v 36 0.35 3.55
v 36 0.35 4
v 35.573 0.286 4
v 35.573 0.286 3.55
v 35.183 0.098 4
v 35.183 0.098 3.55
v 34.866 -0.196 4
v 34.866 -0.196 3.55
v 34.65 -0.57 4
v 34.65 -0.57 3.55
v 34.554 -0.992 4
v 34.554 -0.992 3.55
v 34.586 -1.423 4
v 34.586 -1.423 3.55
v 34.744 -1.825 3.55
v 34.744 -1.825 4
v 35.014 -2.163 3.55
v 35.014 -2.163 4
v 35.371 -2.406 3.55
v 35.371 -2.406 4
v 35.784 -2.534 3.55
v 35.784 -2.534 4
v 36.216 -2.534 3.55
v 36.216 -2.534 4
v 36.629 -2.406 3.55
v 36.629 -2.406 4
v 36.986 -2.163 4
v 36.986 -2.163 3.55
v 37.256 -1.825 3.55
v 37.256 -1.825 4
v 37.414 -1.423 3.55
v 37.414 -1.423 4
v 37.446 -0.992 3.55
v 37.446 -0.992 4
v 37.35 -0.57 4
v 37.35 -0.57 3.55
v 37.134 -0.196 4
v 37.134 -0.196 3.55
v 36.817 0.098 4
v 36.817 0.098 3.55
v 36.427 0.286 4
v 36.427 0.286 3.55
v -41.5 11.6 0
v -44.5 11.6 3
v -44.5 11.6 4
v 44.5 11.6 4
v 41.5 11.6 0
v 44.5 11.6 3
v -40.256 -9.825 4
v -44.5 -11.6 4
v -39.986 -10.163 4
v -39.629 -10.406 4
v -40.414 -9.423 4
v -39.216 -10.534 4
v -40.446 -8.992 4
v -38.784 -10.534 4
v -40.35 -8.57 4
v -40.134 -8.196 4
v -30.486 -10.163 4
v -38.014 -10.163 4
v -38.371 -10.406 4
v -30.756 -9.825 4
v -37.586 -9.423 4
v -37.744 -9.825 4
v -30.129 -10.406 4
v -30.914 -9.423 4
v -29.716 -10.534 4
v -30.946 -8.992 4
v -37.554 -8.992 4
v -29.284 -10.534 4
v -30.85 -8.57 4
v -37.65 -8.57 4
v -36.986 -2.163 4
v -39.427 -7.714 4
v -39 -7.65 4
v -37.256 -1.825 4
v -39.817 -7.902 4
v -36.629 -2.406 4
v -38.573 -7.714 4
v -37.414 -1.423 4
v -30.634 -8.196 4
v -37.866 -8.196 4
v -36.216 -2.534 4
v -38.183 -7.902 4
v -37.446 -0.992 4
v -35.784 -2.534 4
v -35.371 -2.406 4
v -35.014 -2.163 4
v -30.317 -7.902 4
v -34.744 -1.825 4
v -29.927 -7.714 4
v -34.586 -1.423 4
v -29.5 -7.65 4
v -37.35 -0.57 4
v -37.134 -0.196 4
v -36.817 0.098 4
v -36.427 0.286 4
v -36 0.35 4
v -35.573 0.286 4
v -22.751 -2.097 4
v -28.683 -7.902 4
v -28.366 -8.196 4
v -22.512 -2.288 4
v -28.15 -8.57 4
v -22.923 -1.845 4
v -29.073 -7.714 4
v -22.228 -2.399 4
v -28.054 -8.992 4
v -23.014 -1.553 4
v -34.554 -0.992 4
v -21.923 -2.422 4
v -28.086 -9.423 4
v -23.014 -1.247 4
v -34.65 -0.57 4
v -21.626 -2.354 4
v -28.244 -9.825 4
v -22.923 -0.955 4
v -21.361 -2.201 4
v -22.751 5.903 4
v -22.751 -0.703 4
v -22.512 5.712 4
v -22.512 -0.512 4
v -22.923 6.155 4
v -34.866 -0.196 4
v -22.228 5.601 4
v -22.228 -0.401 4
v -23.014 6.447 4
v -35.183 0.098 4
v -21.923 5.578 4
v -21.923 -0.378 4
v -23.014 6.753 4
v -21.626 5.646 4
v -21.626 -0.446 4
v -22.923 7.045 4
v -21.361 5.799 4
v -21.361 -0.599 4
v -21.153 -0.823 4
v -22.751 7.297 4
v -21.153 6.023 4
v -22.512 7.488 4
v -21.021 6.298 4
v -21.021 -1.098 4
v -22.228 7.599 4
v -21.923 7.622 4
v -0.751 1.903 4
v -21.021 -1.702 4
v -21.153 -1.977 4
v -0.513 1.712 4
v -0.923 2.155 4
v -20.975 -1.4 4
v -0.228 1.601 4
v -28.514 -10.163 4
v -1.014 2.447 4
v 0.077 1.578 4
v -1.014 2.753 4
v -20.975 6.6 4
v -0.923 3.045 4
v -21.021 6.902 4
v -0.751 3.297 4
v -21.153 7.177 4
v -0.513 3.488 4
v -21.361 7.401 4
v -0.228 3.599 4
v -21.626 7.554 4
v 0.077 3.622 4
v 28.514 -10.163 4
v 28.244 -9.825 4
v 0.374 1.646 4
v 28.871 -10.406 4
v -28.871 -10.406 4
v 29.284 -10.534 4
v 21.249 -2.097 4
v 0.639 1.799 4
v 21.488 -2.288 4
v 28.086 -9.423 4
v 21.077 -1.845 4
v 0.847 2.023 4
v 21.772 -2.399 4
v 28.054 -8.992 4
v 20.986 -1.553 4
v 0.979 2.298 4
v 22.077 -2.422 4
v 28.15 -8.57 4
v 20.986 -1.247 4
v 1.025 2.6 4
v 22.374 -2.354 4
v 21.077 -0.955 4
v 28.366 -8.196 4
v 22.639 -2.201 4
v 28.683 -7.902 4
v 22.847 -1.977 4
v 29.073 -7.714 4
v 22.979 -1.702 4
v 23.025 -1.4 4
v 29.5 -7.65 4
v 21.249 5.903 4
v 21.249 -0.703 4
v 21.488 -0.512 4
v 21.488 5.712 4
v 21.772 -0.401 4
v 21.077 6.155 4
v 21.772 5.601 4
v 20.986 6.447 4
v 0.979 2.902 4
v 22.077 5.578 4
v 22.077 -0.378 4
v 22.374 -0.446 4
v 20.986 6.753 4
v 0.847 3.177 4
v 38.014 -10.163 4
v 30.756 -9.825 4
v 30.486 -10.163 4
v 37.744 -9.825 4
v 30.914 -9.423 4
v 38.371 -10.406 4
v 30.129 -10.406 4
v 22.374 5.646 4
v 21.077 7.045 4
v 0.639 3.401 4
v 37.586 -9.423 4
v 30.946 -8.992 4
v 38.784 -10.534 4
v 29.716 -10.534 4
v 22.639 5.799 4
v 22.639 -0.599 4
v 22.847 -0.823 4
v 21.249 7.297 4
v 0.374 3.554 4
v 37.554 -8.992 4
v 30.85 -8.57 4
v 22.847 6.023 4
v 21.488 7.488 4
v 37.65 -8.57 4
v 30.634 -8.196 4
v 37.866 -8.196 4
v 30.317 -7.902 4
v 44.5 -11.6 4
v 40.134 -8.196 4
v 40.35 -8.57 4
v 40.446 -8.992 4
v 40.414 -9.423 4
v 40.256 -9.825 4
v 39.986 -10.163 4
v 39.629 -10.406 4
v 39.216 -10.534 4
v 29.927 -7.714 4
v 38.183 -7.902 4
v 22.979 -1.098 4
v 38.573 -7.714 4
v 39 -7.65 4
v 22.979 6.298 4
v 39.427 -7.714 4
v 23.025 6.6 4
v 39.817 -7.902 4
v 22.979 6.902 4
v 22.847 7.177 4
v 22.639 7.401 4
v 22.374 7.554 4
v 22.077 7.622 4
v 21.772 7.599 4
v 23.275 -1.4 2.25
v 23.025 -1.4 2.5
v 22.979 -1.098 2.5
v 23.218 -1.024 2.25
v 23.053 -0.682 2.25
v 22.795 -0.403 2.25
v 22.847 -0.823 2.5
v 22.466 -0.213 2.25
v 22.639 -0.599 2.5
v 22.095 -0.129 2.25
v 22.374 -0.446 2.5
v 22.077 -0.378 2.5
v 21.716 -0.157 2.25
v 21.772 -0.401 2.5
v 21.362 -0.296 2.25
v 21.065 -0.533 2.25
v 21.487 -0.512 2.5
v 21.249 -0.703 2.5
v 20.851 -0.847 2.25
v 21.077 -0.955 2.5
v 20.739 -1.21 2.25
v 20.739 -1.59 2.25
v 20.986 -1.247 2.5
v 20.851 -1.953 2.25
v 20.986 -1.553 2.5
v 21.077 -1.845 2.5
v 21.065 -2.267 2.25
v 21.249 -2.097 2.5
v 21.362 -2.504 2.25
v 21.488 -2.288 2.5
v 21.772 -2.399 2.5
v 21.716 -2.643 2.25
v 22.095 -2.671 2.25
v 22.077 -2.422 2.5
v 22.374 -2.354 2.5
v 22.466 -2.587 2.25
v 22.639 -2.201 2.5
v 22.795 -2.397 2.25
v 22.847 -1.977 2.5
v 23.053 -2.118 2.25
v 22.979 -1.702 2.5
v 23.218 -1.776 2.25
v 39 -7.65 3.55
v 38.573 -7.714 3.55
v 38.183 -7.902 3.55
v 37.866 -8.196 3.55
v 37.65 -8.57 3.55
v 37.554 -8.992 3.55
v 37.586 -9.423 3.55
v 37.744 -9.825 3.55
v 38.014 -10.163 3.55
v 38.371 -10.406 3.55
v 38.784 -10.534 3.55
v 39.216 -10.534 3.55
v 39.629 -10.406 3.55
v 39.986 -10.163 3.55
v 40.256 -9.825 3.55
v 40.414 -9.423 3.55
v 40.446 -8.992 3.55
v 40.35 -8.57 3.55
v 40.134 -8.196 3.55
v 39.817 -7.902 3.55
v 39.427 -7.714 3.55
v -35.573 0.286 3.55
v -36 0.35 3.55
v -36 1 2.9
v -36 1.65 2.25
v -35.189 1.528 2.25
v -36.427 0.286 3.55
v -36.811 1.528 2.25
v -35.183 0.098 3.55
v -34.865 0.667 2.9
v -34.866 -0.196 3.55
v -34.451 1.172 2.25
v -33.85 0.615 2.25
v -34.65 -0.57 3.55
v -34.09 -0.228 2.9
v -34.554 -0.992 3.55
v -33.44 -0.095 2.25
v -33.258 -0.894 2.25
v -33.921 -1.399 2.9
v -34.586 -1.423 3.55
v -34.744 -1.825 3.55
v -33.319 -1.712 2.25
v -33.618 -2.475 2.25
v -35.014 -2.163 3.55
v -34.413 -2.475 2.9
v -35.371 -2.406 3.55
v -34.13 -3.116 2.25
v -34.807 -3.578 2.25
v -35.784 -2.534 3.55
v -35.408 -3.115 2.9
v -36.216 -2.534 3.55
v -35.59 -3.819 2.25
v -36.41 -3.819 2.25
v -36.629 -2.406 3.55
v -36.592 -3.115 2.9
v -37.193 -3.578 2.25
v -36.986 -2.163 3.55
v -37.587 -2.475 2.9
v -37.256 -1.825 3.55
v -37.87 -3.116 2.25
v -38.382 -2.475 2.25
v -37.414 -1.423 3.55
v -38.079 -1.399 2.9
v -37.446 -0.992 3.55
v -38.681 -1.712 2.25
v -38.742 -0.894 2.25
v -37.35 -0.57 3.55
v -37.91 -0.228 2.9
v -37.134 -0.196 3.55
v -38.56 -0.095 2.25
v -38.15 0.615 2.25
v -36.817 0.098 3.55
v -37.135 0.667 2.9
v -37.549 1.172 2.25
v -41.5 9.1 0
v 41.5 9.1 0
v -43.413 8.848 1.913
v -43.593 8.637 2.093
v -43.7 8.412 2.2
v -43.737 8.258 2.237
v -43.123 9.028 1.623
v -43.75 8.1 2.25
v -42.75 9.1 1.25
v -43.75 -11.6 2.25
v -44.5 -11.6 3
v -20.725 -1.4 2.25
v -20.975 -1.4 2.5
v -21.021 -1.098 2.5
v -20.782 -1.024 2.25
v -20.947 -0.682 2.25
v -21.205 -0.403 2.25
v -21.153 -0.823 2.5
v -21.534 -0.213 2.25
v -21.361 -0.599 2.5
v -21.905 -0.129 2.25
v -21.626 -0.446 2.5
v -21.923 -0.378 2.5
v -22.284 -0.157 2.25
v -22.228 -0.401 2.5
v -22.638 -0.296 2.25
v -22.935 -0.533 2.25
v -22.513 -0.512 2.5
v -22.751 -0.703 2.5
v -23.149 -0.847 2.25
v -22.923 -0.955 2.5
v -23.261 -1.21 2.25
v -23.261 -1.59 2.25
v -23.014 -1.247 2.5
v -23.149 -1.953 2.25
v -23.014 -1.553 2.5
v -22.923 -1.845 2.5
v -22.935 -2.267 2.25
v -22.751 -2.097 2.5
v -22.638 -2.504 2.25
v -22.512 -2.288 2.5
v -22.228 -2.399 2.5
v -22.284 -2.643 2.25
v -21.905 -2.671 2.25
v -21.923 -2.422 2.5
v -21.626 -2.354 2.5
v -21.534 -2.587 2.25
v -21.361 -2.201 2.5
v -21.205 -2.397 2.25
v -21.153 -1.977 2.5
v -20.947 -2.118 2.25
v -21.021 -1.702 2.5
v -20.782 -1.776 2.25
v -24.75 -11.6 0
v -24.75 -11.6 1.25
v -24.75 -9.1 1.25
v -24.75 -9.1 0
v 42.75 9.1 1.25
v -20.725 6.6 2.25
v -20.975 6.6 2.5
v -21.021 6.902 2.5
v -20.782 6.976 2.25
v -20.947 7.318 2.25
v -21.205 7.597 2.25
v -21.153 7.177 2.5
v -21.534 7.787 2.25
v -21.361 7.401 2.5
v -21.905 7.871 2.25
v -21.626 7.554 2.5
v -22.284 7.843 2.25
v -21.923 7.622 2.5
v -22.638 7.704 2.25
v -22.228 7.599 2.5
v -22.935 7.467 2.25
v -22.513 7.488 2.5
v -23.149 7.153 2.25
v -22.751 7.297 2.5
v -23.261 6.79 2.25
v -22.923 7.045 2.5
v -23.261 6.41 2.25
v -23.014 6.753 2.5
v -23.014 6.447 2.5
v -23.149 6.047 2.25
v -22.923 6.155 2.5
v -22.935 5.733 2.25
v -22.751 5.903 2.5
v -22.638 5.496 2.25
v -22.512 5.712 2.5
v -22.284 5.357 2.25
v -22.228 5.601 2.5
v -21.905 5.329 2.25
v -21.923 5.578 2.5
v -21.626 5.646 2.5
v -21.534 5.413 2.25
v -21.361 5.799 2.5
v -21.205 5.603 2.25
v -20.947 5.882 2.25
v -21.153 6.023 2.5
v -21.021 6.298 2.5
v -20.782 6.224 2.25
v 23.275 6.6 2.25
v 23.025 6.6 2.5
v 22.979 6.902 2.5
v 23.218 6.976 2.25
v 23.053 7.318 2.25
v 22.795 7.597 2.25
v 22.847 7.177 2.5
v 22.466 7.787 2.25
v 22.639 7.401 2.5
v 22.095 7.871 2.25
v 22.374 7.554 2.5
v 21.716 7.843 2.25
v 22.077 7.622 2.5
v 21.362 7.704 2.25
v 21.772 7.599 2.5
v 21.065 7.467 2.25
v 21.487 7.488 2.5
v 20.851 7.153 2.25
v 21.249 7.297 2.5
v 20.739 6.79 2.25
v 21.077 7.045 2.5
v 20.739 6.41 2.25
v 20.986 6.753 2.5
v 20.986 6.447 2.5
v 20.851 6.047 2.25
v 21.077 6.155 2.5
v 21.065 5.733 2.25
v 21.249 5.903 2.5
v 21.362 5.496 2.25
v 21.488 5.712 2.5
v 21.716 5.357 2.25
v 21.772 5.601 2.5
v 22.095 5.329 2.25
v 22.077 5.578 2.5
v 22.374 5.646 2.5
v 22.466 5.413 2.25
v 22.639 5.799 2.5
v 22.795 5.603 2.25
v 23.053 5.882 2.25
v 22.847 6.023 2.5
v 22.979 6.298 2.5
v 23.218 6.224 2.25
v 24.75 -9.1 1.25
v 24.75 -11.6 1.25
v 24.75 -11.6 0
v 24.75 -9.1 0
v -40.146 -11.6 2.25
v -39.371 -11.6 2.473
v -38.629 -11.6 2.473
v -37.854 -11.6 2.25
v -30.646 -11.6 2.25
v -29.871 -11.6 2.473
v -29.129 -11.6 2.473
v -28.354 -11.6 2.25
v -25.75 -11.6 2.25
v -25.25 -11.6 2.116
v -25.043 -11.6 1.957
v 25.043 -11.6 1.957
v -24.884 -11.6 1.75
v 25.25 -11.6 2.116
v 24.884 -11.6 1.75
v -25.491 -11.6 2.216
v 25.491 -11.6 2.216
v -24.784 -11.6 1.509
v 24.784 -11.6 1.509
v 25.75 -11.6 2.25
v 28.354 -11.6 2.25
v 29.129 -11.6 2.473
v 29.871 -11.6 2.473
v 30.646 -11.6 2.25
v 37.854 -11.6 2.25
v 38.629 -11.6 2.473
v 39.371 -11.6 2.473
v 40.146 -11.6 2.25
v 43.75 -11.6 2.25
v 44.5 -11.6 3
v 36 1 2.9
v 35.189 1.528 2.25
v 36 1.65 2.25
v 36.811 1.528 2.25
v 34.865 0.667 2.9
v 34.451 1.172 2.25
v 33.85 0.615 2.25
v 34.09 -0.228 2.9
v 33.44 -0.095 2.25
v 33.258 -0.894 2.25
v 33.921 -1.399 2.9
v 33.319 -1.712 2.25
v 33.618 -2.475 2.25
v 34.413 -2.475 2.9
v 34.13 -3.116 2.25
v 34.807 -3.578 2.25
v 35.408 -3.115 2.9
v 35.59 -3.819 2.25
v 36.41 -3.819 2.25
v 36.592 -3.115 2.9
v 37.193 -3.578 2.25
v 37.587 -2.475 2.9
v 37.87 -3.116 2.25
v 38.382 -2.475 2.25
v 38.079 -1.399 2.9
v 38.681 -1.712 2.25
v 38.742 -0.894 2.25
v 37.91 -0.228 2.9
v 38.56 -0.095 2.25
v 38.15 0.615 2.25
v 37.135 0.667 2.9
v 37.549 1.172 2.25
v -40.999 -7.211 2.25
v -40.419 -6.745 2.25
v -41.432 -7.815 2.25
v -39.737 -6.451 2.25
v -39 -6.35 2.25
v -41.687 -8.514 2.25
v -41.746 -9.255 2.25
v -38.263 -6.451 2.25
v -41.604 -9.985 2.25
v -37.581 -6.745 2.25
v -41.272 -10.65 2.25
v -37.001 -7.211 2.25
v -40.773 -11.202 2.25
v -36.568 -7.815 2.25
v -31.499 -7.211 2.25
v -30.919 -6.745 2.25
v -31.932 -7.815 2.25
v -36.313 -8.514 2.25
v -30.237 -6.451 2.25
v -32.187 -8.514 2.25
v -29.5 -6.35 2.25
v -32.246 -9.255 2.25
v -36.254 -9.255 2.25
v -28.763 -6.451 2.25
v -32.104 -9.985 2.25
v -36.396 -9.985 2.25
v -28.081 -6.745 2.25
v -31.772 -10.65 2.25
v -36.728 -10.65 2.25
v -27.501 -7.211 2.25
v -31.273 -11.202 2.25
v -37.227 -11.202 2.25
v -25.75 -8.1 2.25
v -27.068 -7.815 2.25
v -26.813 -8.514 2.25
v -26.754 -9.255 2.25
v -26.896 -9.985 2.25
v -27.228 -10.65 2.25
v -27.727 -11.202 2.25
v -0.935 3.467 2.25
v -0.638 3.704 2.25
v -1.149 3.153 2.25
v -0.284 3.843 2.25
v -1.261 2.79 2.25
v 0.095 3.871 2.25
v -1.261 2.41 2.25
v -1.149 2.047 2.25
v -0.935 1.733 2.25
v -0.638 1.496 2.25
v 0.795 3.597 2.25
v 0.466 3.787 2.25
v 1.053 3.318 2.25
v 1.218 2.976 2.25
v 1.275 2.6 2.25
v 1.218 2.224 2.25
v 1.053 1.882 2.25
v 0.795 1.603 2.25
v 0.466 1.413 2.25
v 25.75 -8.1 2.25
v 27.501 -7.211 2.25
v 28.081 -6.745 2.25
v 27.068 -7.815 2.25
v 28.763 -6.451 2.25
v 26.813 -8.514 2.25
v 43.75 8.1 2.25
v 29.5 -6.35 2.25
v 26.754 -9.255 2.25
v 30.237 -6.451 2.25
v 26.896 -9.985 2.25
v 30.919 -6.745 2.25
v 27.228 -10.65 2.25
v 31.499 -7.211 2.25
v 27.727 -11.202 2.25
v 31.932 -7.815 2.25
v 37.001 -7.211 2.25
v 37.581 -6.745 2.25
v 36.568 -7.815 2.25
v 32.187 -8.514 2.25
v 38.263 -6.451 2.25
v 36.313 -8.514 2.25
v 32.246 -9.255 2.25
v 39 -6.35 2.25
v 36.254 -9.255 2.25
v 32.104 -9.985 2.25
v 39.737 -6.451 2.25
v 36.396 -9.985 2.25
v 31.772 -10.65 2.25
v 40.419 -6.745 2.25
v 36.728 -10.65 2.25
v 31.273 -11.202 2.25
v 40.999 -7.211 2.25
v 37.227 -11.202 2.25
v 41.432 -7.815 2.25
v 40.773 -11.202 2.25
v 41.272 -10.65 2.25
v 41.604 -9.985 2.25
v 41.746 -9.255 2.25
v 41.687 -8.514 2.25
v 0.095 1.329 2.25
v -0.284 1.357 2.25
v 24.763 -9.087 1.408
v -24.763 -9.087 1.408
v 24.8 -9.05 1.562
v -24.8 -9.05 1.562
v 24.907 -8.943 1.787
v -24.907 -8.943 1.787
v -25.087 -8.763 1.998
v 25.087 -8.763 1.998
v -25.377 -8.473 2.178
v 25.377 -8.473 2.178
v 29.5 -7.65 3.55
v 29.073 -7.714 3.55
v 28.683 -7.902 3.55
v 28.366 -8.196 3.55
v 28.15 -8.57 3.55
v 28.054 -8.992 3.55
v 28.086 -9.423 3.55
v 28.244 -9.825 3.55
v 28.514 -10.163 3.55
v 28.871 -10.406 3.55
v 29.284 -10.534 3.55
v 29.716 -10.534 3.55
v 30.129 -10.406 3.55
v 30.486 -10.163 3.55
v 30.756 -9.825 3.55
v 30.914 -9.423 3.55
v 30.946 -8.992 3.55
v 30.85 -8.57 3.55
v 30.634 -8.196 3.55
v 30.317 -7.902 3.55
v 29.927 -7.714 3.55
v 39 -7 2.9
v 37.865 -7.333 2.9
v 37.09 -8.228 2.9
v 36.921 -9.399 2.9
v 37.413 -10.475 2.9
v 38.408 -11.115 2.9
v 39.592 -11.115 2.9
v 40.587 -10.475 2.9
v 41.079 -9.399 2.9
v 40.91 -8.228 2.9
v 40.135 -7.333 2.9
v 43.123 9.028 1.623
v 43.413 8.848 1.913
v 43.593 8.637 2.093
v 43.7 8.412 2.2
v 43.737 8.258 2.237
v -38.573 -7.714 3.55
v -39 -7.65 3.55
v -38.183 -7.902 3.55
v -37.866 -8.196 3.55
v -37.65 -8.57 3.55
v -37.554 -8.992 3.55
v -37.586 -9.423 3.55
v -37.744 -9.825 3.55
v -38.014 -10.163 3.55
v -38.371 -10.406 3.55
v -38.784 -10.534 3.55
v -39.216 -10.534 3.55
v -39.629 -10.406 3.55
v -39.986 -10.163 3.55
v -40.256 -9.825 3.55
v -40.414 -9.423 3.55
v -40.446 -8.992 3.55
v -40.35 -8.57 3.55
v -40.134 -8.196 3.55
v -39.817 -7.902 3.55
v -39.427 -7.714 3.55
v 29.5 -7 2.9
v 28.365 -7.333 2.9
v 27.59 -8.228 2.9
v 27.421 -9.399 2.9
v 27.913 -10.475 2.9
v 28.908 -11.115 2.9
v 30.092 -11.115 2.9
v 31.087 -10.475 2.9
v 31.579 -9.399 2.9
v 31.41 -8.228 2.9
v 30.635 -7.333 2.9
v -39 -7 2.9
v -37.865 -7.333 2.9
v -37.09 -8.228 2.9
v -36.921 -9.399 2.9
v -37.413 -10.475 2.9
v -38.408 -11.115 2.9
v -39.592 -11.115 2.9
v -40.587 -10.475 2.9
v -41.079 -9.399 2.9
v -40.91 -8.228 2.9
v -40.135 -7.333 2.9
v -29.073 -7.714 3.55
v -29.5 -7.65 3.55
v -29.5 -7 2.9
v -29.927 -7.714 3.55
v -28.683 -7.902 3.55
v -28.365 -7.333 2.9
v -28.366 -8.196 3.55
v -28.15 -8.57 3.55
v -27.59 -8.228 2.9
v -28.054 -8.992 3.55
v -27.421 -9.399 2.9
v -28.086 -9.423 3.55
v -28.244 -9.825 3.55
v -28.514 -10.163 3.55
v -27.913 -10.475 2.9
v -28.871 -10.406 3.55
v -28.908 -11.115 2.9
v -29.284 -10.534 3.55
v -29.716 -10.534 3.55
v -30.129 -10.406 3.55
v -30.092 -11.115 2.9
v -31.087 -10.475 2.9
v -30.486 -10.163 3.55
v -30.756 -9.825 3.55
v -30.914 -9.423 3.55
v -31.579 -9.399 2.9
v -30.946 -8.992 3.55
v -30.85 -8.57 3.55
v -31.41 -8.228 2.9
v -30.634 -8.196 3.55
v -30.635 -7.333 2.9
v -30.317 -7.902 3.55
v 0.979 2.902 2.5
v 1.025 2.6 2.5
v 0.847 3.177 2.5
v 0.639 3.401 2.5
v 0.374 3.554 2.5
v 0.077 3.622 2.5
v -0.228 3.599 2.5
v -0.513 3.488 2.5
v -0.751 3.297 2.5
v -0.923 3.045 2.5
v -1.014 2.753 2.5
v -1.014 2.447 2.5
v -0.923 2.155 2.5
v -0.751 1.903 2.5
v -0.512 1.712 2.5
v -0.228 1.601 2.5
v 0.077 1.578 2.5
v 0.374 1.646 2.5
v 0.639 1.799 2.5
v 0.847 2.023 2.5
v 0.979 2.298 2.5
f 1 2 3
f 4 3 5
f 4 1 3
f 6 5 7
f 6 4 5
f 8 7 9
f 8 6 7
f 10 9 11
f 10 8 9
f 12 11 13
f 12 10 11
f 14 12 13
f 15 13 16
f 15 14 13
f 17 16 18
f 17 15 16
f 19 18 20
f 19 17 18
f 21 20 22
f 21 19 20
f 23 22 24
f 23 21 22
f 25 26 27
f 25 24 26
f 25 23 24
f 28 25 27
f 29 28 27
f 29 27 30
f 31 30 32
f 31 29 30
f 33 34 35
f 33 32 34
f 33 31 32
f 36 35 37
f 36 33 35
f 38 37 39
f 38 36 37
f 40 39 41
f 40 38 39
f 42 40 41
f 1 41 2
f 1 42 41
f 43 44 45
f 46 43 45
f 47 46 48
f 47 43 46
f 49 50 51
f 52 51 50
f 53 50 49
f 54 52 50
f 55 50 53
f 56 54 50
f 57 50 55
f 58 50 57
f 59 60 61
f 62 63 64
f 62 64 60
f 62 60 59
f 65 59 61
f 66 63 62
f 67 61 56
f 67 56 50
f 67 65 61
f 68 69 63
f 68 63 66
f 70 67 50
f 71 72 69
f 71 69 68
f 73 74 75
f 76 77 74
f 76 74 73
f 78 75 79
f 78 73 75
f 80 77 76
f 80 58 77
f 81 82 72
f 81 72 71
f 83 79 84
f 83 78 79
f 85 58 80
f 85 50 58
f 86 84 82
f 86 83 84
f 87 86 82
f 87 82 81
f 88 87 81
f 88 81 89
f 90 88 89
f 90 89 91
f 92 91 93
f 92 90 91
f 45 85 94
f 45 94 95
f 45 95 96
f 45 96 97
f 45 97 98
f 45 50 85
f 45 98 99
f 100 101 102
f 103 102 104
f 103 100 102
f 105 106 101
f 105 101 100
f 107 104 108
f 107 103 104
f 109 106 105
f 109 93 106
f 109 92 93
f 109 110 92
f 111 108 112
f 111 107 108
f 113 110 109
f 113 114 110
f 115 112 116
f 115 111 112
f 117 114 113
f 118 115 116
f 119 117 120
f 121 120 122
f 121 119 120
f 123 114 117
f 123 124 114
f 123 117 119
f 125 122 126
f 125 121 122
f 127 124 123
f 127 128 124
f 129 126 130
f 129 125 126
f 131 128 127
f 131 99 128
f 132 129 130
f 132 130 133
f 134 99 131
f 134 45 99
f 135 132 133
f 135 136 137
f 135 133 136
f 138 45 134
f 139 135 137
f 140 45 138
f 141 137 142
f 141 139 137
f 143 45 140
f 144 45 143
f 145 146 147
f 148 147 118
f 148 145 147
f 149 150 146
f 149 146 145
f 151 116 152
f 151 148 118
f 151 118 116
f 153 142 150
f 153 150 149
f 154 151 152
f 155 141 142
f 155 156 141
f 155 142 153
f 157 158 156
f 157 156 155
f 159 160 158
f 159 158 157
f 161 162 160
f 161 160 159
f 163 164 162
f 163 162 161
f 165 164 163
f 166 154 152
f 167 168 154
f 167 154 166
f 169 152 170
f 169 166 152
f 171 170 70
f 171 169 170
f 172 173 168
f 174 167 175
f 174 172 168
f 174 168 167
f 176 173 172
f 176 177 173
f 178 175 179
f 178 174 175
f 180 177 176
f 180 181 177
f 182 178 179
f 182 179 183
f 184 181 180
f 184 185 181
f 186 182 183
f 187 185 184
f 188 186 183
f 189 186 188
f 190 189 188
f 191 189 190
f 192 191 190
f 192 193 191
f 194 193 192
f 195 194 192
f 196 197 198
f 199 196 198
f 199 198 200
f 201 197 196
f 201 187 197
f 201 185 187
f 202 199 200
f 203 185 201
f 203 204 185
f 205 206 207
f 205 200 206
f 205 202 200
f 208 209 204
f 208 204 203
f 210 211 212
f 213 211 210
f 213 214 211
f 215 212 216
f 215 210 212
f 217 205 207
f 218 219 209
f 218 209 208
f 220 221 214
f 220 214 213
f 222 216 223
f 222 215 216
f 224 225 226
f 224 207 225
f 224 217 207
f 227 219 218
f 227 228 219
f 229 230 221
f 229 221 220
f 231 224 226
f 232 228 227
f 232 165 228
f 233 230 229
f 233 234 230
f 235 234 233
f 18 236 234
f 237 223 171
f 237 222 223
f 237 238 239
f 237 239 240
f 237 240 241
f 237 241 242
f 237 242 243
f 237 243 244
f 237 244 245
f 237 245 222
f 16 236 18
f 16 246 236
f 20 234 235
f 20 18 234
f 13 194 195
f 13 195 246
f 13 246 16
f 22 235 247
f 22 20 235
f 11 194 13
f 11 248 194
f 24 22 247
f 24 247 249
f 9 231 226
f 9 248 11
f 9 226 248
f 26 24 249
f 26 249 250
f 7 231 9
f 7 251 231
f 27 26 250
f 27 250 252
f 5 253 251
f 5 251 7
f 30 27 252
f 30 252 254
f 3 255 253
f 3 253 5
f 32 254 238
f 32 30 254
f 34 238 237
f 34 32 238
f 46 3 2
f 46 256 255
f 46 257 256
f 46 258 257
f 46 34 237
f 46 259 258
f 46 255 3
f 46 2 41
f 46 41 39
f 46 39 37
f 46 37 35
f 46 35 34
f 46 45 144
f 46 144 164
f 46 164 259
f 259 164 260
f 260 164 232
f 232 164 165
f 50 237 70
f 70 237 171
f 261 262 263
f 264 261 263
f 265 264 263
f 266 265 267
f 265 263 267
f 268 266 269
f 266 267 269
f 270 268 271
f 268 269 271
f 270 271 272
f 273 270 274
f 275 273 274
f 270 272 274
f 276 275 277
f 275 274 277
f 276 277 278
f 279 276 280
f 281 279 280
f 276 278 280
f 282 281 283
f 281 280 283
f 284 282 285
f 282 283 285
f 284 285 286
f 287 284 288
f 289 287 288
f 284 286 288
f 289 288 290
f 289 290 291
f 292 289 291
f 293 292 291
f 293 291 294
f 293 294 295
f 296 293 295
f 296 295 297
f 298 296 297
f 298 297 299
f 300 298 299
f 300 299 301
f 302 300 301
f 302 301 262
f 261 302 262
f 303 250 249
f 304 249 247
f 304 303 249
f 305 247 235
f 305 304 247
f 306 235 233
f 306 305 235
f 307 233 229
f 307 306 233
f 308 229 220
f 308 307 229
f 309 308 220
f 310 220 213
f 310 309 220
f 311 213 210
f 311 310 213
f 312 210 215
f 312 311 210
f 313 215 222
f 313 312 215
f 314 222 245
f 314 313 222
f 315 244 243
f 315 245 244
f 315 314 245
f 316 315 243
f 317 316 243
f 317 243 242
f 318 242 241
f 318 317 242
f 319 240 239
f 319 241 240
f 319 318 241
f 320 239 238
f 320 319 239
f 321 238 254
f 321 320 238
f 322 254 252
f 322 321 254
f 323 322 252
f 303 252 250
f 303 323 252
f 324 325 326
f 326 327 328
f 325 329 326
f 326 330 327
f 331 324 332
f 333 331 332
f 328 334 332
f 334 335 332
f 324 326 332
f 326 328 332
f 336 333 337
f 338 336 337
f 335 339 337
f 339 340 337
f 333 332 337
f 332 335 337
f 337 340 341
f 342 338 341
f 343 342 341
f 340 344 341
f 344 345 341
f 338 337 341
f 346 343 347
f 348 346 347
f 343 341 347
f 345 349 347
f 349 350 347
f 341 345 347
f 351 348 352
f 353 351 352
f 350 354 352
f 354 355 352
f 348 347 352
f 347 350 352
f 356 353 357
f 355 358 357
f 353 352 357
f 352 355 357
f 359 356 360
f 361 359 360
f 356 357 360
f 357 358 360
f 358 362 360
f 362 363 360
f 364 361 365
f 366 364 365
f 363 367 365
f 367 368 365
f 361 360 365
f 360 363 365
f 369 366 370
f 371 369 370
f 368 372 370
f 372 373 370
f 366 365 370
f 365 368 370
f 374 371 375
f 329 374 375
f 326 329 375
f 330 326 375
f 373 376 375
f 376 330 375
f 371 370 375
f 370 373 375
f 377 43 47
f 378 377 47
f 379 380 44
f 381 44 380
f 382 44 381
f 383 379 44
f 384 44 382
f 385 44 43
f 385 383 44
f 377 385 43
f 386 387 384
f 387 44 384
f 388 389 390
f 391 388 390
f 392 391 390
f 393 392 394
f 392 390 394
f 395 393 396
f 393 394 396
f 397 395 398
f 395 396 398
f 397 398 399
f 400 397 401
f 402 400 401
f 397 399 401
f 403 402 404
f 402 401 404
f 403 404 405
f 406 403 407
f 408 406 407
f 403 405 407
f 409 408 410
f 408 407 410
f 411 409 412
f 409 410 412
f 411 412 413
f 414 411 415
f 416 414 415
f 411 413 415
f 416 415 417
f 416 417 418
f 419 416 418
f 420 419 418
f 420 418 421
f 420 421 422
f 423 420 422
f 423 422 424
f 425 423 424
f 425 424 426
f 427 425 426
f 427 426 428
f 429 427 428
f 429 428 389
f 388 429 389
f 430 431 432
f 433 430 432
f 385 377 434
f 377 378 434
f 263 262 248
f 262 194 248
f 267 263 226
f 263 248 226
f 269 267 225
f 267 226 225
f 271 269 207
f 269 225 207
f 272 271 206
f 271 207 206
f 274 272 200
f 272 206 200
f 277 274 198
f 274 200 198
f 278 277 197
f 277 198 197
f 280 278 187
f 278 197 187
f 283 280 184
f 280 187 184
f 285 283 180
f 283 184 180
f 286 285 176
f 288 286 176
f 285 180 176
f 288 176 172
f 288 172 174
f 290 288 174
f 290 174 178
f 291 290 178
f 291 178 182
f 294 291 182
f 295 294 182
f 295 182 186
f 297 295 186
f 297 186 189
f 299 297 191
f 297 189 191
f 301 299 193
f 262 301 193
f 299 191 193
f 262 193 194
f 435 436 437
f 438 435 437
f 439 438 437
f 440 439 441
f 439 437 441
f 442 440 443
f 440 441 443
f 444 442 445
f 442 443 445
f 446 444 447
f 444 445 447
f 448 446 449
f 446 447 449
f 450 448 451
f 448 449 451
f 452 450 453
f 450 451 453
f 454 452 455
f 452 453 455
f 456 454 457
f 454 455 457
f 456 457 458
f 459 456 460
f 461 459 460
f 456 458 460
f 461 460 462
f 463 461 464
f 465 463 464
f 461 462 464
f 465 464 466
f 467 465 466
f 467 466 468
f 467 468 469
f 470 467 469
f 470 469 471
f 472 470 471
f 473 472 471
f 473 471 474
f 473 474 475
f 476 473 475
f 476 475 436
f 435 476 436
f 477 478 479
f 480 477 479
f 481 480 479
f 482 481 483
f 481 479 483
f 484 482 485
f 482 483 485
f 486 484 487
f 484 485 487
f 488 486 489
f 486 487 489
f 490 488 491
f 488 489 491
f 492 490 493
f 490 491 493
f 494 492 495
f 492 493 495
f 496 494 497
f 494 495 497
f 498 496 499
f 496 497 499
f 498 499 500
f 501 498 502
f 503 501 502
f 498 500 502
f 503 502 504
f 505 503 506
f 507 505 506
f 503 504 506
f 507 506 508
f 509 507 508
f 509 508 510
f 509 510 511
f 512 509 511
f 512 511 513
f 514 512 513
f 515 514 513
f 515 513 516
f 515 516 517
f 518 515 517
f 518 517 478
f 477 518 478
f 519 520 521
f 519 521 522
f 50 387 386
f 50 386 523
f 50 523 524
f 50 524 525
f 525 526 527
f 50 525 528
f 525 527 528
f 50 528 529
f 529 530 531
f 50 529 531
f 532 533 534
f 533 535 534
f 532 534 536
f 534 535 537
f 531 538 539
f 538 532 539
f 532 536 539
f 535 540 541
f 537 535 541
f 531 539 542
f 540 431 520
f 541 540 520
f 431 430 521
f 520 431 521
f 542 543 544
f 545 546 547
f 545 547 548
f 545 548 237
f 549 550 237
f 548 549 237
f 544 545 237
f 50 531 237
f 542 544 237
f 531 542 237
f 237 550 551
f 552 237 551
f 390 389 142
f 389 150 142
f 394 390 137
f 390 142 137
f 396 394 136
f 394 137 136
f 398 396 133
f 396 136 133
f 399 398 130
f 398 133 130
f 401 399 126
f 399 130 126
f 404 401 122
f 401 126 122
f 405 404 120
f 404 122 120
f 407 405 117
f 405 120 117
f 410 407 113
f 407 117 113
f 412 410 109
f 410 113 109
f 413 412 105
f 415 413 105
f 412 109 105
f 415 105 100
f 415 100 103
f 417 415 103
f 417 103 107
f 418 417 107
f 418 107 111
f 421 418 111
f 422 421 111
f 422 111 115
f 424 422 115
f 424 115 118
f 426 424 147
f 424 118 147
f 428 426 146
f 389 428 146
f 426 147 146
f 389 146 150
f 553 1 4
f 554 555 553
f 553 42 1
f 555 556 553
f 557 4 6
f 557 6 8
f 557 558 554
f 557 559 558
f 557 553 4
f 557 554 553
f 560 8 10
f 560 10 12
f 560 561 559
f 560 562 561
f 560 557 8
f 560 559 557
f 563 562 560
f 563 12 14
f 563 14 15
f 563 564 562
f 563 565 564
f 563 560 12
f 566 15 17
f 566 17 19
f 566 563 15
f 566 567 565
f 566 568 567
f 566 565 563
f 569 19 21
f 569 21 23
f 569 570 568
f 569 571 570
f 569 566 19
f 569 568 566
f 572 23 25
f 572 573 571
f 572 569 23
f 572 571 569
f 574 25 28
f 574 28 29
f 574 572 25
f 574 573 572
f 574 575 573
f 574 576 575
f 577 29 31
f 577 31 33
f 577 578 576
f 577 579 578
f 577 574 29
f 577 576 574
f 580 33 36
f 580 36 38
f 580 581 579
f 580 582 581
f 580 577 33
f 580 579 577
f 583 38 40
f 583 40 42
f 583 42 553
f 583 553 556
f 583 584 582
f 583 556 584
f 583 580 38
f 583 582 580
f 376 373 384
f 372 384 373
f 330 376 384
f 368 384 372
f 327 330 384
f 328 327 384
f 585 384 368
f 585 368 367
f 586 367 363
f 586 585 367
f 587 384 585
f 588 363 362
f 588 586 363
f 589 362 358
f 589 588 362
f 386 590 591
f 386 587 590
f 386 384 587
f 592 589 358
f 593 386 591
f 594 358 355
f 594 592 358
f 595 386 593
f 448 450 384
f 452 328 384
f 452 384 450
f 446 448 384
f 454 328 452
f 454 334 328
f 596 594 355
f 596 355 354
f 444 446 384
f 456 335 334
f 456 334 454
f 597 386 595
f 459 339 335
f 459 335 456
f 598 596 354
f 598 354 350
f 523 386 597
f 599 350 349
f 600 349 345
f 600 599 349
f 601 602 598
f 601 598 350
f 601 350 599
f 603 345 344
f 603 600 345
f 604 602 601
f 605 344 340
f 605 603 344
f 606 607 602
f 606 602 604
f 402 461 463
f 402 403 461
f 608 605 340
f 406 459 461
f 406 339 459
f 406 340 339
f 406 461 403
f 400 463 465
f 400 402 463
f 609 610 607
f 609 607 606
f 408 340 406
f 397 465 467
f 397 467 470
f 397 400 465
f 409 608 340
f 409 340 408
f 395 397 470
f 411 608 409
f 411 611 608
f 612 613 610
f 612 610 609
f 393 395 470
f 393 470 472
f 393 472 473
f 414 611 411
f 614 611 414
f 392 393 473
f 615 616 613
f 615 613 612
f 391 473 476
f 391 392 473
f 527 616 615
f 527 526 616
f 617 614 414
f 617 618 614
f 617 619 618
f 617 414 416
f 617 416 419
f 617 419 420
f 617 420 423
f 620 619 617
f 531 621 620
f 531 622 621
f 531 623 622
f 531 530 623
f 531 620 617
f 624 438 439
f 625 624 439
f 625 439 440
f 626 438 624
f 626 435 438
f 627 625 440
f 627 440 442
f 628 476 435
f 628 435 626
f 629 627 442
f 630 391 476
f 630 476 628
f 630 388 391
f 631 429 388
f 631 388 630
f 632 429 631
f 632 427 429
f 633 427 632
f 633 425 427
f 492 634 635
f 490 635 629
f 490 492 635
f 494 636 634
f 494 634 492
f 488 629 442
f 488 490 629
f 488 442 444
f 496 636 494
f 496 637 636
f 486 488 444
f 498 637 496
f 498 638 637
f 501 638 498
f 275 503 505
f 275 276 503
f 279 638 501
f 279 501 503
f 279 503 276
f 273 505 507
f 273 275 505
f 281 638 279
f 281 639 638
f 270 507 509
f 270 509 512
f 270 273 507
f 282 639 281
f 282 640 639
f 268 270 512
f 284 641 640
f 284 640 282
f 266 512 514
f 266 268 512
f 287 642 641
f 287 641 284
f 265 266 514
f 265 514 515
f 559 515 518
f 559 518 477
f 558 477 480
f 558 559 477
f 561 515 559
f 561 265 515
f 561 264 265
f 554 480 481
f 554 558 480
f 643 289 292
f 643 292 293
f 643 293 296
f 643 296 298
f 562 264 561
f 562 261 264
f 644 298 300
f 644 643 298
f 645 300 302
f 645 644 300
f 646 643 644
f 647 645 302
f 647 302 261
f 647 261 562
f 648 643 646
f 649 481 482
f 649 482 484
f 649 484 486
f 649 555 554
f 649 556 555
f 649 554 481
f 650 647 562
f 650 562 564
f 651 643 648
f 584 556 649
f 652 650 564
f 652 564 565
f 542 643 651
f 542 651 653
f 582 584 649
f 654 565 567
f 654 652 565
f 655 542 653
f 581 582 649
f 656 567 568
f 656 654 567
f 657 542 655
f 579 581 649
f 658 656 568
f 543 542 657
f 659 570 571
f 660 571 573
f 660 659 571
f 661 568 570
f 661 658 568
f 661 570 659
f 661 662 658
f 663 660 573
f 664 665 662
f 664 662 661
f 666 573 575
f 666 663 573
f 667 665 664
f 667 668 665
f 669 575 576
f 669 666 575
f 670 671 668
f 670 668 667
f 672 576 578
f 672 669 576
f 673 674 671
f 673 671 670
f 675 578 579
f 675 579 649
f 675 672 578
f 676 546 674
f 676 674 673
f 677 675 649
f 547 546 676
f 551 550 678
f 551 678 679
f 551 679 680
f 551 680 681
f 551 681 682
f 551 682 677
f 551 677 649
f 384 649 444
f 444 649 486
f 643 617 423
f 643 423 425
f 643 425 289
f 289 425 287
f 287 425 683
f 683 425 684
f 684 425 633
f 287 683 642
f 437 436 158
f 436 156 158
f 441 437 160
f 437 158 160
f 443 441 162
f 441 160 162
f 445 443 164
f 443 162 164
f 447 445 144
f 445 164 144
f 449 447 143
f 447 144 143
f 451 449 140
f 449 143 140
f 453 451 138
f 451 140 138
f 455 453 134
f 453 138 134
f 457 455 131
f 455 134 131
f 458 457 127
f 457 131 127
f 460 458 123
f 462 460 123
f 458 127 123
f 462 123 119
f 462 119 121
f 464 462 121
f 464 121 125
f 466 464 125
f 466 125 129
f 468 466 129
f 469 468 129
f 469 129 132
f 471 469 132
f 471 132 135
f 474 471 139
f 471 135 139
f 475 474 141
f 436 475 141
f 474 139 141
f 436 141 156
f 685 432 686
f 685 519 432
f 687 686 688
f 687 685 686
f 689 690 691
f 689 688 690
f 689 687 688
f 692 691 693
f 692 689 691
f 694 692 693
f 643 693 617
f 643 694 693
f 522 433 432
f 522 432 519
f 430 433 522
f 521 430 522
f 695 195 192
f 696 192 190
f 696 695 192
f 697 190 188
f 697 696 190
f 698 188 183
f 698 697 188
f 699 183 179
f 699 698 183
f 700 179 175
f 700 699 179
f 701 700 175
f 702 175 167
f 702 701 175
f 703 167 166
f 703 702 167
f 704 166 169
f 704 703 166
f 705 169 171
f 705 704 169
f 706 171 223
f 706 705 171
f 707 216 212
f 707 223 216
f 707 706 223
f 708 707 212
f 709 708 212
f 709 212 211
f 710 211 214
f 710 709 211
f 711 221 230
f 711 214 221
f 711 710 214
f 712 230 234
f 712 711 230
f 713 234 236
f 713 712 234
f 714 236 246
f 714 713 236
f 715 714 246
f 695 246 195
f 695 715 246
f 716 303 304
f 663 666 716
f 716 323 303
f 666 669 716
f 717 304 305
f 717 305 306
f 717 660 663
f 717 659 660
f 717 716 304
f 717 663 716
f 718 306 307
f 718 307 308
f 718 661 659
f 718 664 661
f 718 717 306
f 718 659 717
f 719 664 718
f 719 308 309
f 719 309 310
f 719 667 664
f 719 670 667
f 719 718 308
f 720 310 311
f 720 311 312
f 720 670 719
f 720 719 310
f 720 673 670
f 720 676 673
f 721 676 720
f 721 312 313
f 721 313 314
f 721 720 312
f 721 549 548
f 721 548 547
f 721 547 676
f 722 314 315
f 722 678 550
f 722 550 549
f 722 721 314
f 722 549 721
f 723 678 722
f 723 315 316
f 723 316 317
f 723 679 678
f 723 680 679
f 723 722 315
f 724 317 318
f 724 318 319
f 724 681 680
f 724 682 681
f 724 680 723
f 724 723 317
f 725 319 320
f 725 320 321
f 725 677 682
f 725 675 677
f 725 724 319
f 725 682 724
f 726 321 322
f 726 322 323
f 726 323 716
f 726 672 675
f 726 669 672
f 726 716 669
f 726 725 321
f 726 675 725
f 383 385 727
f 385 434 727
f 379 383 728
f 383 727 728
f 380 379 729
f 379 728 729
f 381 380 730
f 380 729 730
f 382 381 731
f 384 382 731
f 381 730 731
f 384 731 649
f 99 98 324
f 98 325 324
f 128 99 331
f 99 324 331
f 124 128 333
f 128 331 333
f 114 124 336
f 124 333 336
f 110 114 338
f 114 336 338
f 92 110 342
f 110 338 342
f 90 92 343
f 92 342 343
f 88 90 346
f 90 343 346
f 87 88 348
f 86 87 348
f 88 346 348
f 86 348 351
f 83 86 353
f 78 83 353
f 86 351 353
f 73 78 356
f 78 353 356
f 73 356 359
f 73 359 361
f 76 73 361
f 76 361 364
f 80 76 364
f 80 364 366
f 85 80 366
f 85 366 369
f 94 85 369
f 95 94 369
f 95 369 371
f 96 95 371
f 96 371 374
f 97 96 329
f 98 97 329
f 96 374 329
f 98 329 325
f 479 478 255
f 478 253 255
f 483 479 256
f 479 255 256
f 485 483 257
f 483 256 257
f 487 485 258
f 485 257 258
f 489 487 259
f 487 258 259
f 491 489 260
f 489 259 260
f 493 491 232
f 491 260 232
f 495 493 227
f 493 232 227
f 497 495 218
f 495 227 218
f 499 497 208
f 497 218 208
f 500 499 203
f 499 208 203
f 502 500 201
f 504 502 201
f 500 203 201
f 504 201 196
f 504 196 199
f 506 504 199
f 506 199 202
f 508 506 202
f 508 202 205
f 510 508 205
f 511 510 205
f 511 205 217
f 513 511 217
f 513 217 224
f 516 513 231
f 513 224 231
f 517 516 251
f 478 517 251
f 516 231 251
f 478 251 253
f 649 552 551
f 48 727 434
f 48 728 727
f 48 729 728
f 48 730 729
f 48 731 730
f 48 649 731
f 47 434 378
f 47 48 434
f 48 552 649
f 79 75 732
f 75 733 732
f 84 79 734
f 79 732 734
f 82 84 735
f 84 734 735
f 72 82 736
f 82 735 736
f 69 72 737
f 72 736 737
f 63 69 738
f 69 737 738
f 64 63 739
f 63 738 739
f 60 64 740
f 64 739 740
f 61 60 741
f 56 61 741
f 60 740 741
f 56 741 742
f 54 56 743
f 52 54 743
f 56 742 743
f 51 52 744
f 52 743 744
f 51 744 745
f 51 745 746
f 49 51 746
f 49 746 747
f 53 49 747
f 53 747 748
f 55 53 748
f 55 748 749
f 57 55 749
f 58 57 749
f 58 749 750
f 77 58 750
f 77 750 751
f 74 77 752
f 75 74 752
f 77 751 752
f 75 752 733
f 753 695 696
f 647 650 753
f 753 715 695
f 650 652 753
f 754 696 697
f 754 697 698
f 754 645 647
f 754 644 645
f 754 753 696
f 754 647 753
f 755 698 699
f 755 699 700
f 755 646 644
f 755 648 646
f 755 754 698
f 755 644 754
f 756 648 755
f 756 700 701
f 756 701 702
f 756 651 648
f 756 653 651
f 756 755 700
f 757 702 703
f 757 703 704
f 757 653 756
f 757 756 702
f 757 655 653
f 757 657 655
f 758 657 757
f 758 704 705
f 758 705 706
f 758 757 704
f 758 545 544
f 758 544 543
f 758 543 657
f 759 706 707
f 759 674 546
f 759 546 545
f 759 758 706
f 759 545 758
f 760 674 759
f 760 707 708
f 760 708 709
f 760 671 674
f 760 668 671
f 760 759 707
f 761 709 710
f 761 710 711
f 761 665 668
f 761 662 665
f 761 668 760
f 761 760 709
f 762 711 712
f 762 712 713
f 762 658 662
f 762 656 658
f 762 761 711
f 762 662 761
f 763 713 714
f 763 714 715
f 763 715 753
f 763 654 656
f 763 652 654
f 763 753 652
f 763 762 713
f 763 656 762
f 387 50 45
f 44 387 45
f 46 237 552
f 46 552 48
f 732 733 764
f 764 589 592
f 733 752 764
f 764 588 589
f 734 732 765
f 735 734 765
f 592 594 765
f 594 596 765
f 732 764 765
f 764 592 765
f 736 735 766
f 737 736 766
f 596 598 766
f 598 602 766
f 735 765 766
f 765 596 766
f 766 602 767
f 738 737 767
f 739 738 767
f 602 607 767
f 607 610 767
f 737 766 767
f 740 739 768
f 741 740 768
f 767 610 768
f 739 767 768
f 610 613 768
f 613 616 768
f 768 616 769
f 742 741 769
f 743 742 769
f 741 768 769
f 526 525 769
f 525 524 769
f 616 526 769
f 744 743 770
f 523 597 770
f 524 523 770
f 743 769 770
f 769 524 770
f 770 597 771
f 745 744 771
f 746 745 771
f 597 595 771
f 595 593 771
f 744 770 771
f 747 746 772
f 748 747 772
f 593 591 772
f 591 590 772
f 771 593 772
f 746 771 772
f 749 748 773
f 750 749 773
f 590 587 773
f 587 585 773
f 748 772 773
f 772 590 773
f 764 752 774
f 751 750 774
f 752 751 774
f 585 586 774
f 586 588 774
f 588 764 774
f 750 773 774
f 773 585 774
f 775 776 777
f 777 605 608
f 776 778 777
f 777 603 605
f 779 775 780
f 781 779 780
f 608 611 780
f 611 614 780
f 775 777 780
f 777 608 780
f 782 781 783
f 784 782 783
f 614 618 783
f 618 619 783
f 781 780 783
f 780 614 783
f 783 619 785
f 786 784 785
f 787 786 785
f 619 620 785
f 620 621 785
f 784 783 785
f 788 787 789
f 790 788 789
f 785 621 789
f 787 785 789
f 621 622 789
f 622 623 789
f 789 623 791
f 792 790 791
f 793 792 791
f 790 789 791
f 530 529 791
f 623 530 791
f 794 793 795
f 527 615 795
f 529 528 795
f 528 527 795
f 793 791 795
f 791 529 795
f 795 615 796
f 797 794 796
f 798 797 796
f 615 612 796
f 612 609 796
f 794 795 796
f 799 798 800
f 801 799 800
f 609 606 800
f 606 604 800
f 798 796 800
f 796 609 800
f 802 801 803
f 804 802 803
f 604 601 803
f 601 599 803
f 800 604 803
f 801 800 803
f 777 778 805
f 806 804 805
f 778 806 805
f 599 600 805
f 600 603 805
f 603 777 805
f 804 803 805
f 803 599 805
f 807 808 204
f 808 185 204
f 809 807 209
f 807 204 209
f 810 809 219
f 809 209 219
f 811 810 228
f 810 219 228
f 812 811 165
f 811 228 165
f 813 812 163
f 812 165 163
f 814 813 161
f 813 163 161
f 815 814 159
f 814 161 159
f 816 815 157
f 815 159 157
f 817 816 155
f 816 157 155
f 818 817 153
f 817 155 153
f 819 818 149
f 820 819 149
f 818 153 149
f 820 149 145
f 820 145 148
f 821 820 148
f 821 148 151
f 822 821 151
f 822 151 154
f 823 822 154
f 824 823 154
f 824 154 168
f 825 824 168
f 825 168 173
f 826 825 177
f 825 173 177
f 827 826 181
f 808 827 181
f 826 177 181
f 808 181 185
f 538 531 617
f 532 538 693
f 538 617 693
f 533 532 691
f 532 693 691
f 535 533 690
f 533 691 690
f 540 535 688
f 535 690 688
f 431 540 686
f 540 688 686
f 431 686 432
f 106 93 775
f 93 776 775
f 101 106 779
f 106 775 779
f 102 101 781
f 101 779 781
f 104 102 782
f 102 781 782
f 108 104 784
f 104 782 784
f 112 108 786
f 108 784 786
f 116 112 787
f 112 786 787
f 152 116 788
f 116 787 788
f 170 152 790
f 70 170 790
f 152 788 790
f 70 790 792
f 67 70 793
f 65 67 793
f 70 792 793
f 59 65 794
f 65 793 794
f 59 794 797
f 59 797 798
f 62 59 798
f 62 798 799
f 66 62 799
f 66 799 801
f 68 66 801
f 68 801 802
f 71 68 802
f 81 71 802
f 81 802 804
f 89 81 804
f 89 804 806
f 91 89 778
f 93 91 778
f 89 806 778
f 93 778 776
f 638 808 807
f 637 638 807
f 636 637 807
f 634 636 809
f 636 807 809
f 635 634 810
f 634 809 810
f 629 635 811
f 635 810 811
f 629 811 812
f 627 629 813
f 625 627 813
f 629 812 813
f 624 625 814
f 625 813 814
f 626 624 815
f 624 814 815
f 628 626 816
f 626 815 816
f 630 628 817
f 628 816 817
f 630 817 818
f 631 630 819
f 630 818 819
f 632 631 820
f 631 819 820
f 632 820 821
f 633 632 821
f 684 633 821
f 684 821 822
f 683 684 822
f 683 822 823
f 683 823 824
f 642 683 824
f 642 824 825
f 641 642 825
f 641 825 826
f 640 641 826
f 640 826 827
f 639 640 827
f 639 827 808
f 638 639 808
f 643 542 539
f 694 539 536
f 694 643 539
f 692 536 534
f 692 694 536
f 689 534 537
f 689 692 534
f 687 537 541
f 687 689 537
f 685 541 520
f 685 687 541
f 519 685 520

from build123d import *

# Parameters (mm, degrees)
SKETCH1_W                                      = 94
SKETCH1_H                                      = 23.2
BOSS_EXTRUDE1_DEPTH                            = 4
CHAMFER1_SIZE                                  = 5.5
CUT_EXTRUDE2_DEPTH                             = 48.12547082
CUT_EXTRUDE2_DEPTH_BACK                        = 48.12547082
SKETCH9_W                                      = 30.391833943
SKETCH9_H                                      = 23.2
SHELL1_START                                   = -9.1
SHELL1_DEPTH                                   = 18.2
FILLET1_R                                      = 1
M2_5X0_45_TAPPED_HOLE1_D                       = 2.05
M2_5X0_45_TAPPED_HOLE1_DEPTH                   = 6
M2_5X0_45_TAPPED_HOLE1_CSINK_D                 = 2.55
M2_5X0_45_TAPPED_HOLE1_CSINK_ANGLE             = 90
M2_5X0_45_TAPPED_HOLE1_TIP                     = 0.615882135
CSK_FOR_M2_5_FLAT_HEAD_MACHINE_SCREW1_AT_COUNT = 2
CSK_FOR_M2_5_FLAT_HEAD_MACHINE_SCREW1_AT_PITCH = 8.544003745
CSK_FOR_M2_5_FLAT_HEAD_MACHINE_SCREW_2_COUNT   = 2
CSK_FOR_M2_5_FLAT_HEAD_MACHINE_SCREW_2_PITCH   = 10.307764064
SKETCH8_W                                      = 19.75
SKETCH8_H                                      = 5.25
CUT_EXTRUDE1_DEPTH                             = 47.042073151
FILLET5_R                                      = 1
FILLET5_OF_MIRROR1_R                           = 1


# Read off the part's stored shape, not the designer's step: Shell1
with BuildPart() as part:
    # Sketch1 → Boss-Extrude1 (new body)
    with BuildSketch(Plane.XY):
        Rectangle(SKETCH1_W, SKETCH1_H)
    extrude(amount=BOSS_EXTRUDE1_DEPTH)

    # Chamfer1
    # the kernel refuses this chamfer: 5.5 mm, written as the material it takes off along each edge
    with BuildSketch(Plane(origin=(47, 25.744256434, 0), x_dir=(0.027495876610585942, 0, 0.9996219169112968), z_dir=(0, -1, 0)), Plane(origin=(-47, -25.744256434, 0), x_dir=(-0.027495876610585942, 0, 0.9996219169112968), z_dir=(0, 1, 0))) as chamfer1_piece_1:
        Polygon((CHAMFER1_SIZE * 0.999621916911, CHAMFER1_SIZE * 0.0274958766106), (-CHAMFER1_SIZE * 0.0274958766106, CHAMFER1_SIZE * 0.999621916911), (0, 0), align=None)
    extrude(amount=51.488512868, mode=Mode.SUBTRACT)

    # Sketch9 → Cut-Extrude2 (cut, two sides: drawn at the far end of the back side and taken through both)
    with BuildSketch(Plane(origin=(0, 0, 0), x_dir=(-1, 0, 0), z_dir=(0, 0, -1)).offset(-CUT_EXTRUDE2_DEPTH_BACK)):
        with Locations((-59.695916972, 0)):
            Rectangle(SKETCH9_W, SKETCH9_H)
        with Locations((59.695916972, 0)):
            Rectangle(SKETCH9_W, SKETCH9_H)
    extrude(amount=CUT_EXTRUDE2_DEPTH + CUT_EXTRUDE2_DEPTH_BACK, mode=Mode.SUBTRACT)

    # Shell1 outline → Shell1 (cut)
    with BuildSketch(Plane(origin=(0, 0, 0), x_dir=(1, 0, 0), z_dir=(0, 1, 0)).offset(SHELL1_START)):
        Polygon((-41.5, 0), (-43.75, -2.25), (43.75, -2.25), (41.5, 0), align=None)
    extrude(amount=SHELL1_DEPTH, mode=Mode.SUBTRACT)

    # Fillet1
    fillet1_edges = [part.edges().sort_by_distance(p)[0] for p in [
        (0, 9.1, 2.25),
        (0, -9.1, 2.25),
    ]]
    fillet(fillet1_edges, radius=FILLET1_R)

    # M2.5x0.45 Tapped Hole1
    with Locations(Plane(origin=(0, 0, 2.25), x_dir=(-1, 0, 0), z_dir=(0, 0, -1))):
        with Locations((0, 2.6), (-22, 6.6), (-22, -1.4), (22, -1.4), (22, 6.6)):
            CounterSinkHole(M2_5X0_45_TAPPED_HOLE1_D / 2, M2_5X0_45_TAPPED_HOLE1_CSINK_D / 2, depth=M2_5X0_45_TAPPED_HOLE1_DEPTH, counter_sink_angle=M2_5X0_45_TAPPED_HOLE1_CSINK_ANGLE)
            with Locations((0, 0, -(M2_5X0_45_TAPPED_HOLE1_DEPTH + M2_5X0_45_TAPPED_HOLE1_TIP / 2))):  # 118° drill point
                Cone(0, M2_5X0_45_TAPPED_HOLE1_D / 2, M2_5X0_45_TAPPED_HOLE1_TIP, mode=Mode.SUBTRACT)

    # Sketch5 → CSK for M2.5 Flat Head Machine Screw1 (revolve, cut)
    with BuildSketch(Plane(origin=(36, -1.1, 2.25), x_dir=(0, 1, 0), z_dir=(1, 0, 0))):
        Polygon((0, 0), (0, 7.321247898), (1.45, 6.45), (1.45, 1.3), (2.75, 0), align=None)
    csk_for_m2_5_flat_head_machine_screw1 = revolve(axis=Axis((36, -1.1, -4.1), (0, 0, 1)), mode=Mode.SUBTRACT)

    # CSK for M2.5 Flat Head Machine Screw1 at: CSK for M2.5 Flat Head Machine Screw1 ×2
    with Locations(*[Vector(0.35112344158839104, -0.9363291775690448, 0) * (i * CSK_FOR_M2_5_FLAT_HEAD_MACHINE_SCREW1_AT_PITCH) for i in range(1, CSK_FOR_M2_5_FLAT_HEAD_MACHINE_SCREW1_AT_COUNT)]):
        add(csk_for_m2_5_flat_head_machine_screw1, mode=Mode.SUBTRACT)

    # CSK for M2.5 Flat Head Machine Screw 2: CSK for M2.5 Flat Head Machine Screw1 ×2
    with Locations(*[Vector(-0.6305926250944661, -0.7761140001162652, 0) * (i * CSK_FOR_M2_5_FLAT_HEAD_MACHINE_SCREW_2_PITCH) for i in range(1, CSK_FOR_M2_5_FLAT_HEAD_MACHINE_SCREW_2_COUNT)]):
        add(csk_for_m2_5_flat_head_machine_screw1, mode=Mode.SUBTRACT)

    # Sketch8 → Cut-Extrude1 (cut, through all)
    with BuildSketch(Plane(origin=(0, 0, 2.25), x_dir=(-1, 0, 0), z_dir=(0, 0, -1))):
        with Locations((-34.625, -8.975)):
            Rectangle(SKETCH8_W, SKETCH8_H)
    cut_extrude1 = extrude(amount=CUT_EXTRUDE1_DEPTH, mode=Mode.SUBTRACT)

    # Fillet5
    fillet5_edges = [part.edges().sort_by_distance(p)[0] for p in [
        (24.75, -9.85, 2.25),
    ]]
    fillet(fillet5_edges, radius=FILLET5_R)

    # Mirror1: CSK for M2.5 Flat Head Machine Screw1, Cut-Extrude1 across plane
    add(csk_for_m2_5_flat_head_machine_screw1.mirror(Plane(origin=(0, 0, 0), x_dir=(0, 0, 1), z_dir=(1, 0, 0))), mode=Mode.SUBTRACT)
    add(cut_extrude1.mirror(Plane(origin=(0, 0, 0), x_dir=(0, 0, 1), z_dir=(1, 0, 0))), mode=Mode.SUBTRACT)

    # Mirror1 copy 1 sketch → Mirror1 copy 1 (revolve, cut)
    with BuildSketch(Plane(origin=(-39, -9.1, 2.25), x_dir=(0, 1, 0), z_dir=(-1, 0, 0))):
        Polygon((0, 0), (0, -7.321247898), (1.45, -6.45), (1.45, -1.3), (2.75, 0), align=None)
    revolve(axis=Axis((-39, -9.1, -4.1), (0, 0, -1)), mode=Mode.SUBTRACT)

    # Mirror1 copy 2 sketch → Mirror1 copy 2 (revolve, cut)
    with BuildSketch(Plane(origin=(-29.5, -9.1, 2.25), x_dir=(0, 1, 0), z_dir=(-1, 0, 0))):
        Polygon((0, 0), (0, -7.321247898), (1.45, -6.45), (1.45, -1.3), (2.75, 0), align=None)
    revolve(axis=Axis((-29.5, -9.1, -4.1), (0, 0, -1)), mode=Mode.SUBTRACT)

    # Fillet5 of Mirror1
    fillet5_of_mirror1_edges = [part.edges().sort_by_distance(p)[0] for p in [
        (-24.75, -9.85, 2.25),
    ]]
    fillet(fillet5_of_mirror1_edges, radius=FILLET5_OF_MIRROR1_R)


solid = part.part
